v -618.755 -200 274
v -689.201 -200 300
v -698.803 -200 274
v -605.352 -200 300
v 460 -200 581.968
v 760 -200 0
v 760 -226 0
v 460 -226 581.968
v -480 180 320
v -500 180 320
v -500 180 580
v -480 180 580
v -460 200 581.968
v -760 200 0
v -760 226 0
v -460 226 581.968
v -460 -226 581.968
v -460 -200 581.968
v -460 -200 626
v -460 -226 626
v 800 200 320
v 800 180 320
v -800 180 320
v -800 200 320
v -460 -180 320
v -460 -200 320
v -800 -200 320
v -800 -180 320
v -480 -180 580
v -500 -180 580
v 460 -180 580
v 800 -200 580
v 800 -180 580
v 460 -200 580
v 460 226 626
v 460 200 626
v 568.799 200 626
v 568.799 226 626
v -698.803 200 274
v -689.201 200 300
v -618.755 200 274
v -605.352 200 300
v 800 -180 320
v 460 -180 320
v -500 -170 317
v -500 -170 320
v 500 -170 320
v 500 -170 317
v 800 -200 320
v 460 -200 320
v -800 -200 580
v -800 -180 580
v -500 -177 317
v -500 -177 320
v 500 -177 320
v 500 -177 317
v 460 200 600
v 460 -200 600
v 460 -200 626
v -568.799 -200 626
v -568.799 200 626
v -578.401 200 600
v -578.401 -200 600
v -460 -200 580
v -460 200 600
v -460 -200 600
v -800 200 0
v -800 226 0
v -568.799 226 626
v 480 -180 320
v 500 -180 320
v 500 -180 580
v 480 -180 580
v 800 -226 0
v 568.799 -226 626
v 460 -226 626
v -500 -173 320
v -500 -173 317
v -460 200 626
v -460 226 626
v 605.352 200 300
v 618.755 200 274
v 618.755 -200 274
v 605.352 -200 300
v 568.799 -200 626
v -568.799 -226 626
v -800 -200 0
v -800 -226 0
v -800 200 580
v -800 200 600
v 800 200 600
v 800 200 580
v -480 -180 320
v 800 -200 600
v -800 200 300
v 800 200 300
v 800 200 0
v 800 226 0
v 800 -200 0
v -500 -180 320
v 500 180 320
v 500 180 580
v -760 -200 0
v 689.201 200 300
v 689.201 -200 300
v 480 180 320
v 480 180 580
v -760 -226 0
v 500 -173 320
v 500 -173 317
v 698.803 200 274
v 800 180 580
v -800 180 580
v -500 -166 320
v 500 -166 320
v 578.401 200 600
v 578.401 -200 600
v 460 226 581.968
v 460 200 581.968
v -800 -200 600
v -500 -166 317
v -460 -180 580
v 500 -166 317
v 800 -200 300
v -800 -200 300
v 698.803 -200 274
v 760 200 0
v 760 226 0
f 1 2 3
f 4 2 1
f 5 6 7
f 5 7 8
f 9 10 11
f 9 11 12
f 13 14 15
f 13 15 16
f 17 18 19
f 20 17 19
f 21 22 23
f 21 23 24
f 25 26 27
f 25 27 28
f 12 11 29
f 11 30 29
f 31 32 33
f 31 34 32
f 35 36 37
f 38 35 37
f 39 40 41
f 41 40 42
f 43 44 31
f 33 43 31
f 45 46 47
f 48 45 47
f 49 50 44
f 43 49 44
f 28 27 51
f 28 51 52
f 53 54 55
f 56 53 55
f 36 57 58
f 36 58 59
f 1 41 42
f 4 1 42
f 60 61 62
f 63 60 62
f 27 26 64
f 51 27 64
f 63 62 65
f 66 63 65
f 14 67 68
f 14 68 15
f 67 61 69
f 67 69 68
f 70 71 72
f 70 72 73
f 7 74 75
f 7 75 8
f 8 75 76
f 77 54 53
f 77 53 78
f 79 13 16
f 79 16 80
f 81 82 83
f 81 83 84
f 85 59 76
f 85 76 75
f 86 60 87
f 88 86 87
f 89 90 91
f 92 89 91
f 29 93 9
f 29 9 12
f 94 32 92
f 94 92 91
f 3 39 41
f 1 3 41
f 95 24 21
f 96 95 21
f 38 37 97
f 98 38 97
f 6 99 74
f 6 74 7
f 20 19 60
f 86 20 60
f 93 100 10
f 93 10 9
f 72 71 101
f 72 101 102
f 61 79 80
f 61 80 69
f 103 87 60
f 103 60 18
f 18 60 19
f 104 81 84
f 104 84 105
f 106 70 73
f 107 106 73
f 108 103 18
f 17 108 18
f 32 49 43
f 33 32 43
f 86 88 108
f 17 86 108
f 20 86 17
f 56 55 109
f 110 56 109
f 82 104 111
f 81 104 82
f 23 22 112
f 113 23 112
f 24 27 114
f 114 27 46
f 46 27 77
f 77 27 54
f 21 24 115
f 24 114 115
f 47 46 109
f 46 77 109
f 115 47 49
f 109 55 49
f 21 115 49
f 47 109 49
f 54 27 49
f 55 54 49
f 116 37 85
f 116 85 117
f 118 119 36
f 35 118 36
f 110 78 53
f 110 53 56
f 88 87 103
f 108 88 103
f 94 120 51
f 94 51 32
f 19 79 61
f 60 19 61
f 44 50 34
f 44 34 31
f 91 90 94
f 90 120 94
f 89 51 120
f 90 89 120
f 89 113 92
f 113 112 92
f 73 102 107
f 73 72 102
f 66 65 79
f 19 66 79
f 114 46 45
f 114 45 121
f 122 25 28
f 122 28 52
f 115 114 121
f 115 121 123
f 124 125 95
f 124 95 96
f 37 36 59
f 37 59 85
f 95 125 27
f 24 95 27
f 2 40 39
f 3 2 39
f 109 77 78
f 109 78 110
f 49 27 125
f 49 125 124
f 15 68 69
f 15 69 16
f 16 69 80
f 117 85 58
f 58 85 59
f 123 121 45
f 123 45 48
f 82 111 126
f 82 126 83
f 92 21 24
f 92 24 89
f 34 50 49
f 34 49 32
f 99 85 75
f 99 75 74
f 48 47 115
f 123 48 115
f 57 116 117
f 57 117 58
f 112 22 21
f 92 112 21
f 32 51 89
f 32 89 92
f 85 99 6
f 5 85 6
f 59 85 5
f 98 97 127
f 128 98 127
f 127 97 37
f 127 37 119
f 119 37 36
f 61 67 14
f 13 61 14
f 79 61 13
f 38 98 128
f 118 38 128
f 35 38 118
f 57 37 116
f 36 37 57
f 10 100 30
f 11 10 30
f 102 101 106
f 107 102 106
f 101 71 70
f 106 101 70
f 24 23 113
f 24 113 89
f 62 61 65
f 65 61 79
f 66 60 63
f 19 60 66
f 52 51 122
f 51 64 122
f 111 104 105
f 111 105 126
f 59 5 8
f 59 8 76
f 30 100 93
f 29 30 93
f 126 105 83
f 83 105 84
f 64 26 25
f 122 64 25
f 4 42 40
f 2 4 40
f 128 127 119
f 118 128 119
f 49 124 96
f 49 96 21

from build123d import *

# Parameters (mm, degrees)
F5_W           = 1600
F5_H           = 20
F6_DEPTH       = 200
F7_W           = 20
F7_H           = 260
F8_DEPTH       = 800
F9_W           = 20
F9_H           = 260
F10_DEPTH      = 180
F12_W          = 20
F12_H          = 260
F13_DEPTH      = 20
F13_DEPTH_BACK = 320
F15_W          = 1000
F15_H          = 4
F16_DEPTH      = 3
F18_DEPTH      = 26
F23_DEPTH      = 400
F26_DEPTH      = 400


with BuildPart() as f6:
    # F5 (on Front) → F6 (new body, symmetric)
    with BuildSketch(Plane.XZ):
        with Locations((0, 590)):
            Rectangle(F5_W, F5_H)
    extrude(amount=F6_DEPTH, both=True)


with BuildPart() as f6b:
    # F5 (on Front) → F6, piece 2 (new body, symmetric)
    with BuildSketch(Plane.XZ):
        with Locations((0, 310)):
            Rectangle(F5_W, F5_H)
    extrude(amount=F6_DEPTH, both=True)

    # F15 (on face) → F16 (cut)
    with BuildSketch(Plane.XY.offset(320)):
        with Locations((0, -175)):
            Rectangle(F15_W, F15_H)
        with Locations((0, -168)):
            Rectangle(F15_W, F15_H)
    extrude(amount=-F16_DEPTH, mode=Mode.SUBTRACT)


with BuildPart() as f8:
    # F7 (on Right) → F8 (new body, symmetric)
    with BuildSketch(Plane.YZ):
        with Locations((190, 450)):
            Rectangle(F7_W, F7_H)
    extrude(amount=F8_DEPTH, both=True)


with BuildPart() as f10:
    # F9 (on Front) → F10 (new body, symmetric)
    with BuildSketch(Plane.XZ):
        with Locations((-490, 450)):
            Rectangle(F9_W, F9_H)
    extrude(amount=F10_DEPTH, both=True)


with BuildPart() as f11_1:
    # F11: instance of F10
    add(f10.part.mirror(Plane.YZ))


with BuildPart() as f13:
    # F12 (on face) → F13 (new body, two sides)
    with BuildSketch(Plane.YZ.offset(-480)) as f13_sk:
        with Locations((-190, 450)):
            Rectangle(F12_W, F12_H)
    extrude(amount=F13_DEPTH)
    extrude(f13_sk.sketch, amount=-F13_DEPTH_BACK)


with BuildPart() as f14_1:
    # F14: instance of F13
    add(f13.part.mirror(Plane.YZ))


with BuildPart() as f18:
    # F17 (on face) → F18 (new body)
    with BuildSketch(Plane.XZ.offset(200)):
        Polygon((-568.7985971229, 626), (-800, 0), (-760, 0), (-460, 581.9677017772), (-460, 626), align=None)
    extrude(amount=F18_DEPTH)


with BuildPart() as f19_1:
    # F19: instance of F18
    add(f18.part.mirror(Plane.YZ))


with BuildPart() as f20_1:
    # F20: instance of F18
    add(f18.part.mirror(Plane.XZ))


with BuildPart() as f21_1:
    # F21: instance of F19_1
    add(f19_1.part.mirror(Plane.XZ))


with BuildPart() as f23:
    # F22 (on face) → F23 (new body, through all)
    with BuildSketch(Plane.XZ.offset(-200)):
        Polygon((-568.7985971229, 626), (-578.4012112999, 600), (-460, 600), (-460, 626), align=None)
    extrude(amount=F23_DEPTH)


with BuildPart() as f24_1:
    # F24: instance of F23
    add(f23.part.mirror(Plane.YZ))


with BuildPart() as f26:
    # F25 (on face) → F26 (new body, through all)
    with BuildSketch(Plane.XZ.offset(-200)):
        Polygon((-605.3524269362, 299.9996422712), (-689.2007377704, 299.9996422712), (-698.8033519474, 273.9996422712), (-618.7552325836, 273.9996422712), align=None)
    extrude(amount=F26_DEPTH)


with BuildPart() as f27_1:
    # F27: instance of F26
    add(f26.part.mirror(Plane.YZ))


solid = Compound([f6.part, f6b.part, f8.part, f10.part, f11_1.part, f13.part, f14_1.part, f18.part, f19_1.part, f20_1.part, f21_1.part, f23.part, f24_1.part, f26.part, f27_1.part])
